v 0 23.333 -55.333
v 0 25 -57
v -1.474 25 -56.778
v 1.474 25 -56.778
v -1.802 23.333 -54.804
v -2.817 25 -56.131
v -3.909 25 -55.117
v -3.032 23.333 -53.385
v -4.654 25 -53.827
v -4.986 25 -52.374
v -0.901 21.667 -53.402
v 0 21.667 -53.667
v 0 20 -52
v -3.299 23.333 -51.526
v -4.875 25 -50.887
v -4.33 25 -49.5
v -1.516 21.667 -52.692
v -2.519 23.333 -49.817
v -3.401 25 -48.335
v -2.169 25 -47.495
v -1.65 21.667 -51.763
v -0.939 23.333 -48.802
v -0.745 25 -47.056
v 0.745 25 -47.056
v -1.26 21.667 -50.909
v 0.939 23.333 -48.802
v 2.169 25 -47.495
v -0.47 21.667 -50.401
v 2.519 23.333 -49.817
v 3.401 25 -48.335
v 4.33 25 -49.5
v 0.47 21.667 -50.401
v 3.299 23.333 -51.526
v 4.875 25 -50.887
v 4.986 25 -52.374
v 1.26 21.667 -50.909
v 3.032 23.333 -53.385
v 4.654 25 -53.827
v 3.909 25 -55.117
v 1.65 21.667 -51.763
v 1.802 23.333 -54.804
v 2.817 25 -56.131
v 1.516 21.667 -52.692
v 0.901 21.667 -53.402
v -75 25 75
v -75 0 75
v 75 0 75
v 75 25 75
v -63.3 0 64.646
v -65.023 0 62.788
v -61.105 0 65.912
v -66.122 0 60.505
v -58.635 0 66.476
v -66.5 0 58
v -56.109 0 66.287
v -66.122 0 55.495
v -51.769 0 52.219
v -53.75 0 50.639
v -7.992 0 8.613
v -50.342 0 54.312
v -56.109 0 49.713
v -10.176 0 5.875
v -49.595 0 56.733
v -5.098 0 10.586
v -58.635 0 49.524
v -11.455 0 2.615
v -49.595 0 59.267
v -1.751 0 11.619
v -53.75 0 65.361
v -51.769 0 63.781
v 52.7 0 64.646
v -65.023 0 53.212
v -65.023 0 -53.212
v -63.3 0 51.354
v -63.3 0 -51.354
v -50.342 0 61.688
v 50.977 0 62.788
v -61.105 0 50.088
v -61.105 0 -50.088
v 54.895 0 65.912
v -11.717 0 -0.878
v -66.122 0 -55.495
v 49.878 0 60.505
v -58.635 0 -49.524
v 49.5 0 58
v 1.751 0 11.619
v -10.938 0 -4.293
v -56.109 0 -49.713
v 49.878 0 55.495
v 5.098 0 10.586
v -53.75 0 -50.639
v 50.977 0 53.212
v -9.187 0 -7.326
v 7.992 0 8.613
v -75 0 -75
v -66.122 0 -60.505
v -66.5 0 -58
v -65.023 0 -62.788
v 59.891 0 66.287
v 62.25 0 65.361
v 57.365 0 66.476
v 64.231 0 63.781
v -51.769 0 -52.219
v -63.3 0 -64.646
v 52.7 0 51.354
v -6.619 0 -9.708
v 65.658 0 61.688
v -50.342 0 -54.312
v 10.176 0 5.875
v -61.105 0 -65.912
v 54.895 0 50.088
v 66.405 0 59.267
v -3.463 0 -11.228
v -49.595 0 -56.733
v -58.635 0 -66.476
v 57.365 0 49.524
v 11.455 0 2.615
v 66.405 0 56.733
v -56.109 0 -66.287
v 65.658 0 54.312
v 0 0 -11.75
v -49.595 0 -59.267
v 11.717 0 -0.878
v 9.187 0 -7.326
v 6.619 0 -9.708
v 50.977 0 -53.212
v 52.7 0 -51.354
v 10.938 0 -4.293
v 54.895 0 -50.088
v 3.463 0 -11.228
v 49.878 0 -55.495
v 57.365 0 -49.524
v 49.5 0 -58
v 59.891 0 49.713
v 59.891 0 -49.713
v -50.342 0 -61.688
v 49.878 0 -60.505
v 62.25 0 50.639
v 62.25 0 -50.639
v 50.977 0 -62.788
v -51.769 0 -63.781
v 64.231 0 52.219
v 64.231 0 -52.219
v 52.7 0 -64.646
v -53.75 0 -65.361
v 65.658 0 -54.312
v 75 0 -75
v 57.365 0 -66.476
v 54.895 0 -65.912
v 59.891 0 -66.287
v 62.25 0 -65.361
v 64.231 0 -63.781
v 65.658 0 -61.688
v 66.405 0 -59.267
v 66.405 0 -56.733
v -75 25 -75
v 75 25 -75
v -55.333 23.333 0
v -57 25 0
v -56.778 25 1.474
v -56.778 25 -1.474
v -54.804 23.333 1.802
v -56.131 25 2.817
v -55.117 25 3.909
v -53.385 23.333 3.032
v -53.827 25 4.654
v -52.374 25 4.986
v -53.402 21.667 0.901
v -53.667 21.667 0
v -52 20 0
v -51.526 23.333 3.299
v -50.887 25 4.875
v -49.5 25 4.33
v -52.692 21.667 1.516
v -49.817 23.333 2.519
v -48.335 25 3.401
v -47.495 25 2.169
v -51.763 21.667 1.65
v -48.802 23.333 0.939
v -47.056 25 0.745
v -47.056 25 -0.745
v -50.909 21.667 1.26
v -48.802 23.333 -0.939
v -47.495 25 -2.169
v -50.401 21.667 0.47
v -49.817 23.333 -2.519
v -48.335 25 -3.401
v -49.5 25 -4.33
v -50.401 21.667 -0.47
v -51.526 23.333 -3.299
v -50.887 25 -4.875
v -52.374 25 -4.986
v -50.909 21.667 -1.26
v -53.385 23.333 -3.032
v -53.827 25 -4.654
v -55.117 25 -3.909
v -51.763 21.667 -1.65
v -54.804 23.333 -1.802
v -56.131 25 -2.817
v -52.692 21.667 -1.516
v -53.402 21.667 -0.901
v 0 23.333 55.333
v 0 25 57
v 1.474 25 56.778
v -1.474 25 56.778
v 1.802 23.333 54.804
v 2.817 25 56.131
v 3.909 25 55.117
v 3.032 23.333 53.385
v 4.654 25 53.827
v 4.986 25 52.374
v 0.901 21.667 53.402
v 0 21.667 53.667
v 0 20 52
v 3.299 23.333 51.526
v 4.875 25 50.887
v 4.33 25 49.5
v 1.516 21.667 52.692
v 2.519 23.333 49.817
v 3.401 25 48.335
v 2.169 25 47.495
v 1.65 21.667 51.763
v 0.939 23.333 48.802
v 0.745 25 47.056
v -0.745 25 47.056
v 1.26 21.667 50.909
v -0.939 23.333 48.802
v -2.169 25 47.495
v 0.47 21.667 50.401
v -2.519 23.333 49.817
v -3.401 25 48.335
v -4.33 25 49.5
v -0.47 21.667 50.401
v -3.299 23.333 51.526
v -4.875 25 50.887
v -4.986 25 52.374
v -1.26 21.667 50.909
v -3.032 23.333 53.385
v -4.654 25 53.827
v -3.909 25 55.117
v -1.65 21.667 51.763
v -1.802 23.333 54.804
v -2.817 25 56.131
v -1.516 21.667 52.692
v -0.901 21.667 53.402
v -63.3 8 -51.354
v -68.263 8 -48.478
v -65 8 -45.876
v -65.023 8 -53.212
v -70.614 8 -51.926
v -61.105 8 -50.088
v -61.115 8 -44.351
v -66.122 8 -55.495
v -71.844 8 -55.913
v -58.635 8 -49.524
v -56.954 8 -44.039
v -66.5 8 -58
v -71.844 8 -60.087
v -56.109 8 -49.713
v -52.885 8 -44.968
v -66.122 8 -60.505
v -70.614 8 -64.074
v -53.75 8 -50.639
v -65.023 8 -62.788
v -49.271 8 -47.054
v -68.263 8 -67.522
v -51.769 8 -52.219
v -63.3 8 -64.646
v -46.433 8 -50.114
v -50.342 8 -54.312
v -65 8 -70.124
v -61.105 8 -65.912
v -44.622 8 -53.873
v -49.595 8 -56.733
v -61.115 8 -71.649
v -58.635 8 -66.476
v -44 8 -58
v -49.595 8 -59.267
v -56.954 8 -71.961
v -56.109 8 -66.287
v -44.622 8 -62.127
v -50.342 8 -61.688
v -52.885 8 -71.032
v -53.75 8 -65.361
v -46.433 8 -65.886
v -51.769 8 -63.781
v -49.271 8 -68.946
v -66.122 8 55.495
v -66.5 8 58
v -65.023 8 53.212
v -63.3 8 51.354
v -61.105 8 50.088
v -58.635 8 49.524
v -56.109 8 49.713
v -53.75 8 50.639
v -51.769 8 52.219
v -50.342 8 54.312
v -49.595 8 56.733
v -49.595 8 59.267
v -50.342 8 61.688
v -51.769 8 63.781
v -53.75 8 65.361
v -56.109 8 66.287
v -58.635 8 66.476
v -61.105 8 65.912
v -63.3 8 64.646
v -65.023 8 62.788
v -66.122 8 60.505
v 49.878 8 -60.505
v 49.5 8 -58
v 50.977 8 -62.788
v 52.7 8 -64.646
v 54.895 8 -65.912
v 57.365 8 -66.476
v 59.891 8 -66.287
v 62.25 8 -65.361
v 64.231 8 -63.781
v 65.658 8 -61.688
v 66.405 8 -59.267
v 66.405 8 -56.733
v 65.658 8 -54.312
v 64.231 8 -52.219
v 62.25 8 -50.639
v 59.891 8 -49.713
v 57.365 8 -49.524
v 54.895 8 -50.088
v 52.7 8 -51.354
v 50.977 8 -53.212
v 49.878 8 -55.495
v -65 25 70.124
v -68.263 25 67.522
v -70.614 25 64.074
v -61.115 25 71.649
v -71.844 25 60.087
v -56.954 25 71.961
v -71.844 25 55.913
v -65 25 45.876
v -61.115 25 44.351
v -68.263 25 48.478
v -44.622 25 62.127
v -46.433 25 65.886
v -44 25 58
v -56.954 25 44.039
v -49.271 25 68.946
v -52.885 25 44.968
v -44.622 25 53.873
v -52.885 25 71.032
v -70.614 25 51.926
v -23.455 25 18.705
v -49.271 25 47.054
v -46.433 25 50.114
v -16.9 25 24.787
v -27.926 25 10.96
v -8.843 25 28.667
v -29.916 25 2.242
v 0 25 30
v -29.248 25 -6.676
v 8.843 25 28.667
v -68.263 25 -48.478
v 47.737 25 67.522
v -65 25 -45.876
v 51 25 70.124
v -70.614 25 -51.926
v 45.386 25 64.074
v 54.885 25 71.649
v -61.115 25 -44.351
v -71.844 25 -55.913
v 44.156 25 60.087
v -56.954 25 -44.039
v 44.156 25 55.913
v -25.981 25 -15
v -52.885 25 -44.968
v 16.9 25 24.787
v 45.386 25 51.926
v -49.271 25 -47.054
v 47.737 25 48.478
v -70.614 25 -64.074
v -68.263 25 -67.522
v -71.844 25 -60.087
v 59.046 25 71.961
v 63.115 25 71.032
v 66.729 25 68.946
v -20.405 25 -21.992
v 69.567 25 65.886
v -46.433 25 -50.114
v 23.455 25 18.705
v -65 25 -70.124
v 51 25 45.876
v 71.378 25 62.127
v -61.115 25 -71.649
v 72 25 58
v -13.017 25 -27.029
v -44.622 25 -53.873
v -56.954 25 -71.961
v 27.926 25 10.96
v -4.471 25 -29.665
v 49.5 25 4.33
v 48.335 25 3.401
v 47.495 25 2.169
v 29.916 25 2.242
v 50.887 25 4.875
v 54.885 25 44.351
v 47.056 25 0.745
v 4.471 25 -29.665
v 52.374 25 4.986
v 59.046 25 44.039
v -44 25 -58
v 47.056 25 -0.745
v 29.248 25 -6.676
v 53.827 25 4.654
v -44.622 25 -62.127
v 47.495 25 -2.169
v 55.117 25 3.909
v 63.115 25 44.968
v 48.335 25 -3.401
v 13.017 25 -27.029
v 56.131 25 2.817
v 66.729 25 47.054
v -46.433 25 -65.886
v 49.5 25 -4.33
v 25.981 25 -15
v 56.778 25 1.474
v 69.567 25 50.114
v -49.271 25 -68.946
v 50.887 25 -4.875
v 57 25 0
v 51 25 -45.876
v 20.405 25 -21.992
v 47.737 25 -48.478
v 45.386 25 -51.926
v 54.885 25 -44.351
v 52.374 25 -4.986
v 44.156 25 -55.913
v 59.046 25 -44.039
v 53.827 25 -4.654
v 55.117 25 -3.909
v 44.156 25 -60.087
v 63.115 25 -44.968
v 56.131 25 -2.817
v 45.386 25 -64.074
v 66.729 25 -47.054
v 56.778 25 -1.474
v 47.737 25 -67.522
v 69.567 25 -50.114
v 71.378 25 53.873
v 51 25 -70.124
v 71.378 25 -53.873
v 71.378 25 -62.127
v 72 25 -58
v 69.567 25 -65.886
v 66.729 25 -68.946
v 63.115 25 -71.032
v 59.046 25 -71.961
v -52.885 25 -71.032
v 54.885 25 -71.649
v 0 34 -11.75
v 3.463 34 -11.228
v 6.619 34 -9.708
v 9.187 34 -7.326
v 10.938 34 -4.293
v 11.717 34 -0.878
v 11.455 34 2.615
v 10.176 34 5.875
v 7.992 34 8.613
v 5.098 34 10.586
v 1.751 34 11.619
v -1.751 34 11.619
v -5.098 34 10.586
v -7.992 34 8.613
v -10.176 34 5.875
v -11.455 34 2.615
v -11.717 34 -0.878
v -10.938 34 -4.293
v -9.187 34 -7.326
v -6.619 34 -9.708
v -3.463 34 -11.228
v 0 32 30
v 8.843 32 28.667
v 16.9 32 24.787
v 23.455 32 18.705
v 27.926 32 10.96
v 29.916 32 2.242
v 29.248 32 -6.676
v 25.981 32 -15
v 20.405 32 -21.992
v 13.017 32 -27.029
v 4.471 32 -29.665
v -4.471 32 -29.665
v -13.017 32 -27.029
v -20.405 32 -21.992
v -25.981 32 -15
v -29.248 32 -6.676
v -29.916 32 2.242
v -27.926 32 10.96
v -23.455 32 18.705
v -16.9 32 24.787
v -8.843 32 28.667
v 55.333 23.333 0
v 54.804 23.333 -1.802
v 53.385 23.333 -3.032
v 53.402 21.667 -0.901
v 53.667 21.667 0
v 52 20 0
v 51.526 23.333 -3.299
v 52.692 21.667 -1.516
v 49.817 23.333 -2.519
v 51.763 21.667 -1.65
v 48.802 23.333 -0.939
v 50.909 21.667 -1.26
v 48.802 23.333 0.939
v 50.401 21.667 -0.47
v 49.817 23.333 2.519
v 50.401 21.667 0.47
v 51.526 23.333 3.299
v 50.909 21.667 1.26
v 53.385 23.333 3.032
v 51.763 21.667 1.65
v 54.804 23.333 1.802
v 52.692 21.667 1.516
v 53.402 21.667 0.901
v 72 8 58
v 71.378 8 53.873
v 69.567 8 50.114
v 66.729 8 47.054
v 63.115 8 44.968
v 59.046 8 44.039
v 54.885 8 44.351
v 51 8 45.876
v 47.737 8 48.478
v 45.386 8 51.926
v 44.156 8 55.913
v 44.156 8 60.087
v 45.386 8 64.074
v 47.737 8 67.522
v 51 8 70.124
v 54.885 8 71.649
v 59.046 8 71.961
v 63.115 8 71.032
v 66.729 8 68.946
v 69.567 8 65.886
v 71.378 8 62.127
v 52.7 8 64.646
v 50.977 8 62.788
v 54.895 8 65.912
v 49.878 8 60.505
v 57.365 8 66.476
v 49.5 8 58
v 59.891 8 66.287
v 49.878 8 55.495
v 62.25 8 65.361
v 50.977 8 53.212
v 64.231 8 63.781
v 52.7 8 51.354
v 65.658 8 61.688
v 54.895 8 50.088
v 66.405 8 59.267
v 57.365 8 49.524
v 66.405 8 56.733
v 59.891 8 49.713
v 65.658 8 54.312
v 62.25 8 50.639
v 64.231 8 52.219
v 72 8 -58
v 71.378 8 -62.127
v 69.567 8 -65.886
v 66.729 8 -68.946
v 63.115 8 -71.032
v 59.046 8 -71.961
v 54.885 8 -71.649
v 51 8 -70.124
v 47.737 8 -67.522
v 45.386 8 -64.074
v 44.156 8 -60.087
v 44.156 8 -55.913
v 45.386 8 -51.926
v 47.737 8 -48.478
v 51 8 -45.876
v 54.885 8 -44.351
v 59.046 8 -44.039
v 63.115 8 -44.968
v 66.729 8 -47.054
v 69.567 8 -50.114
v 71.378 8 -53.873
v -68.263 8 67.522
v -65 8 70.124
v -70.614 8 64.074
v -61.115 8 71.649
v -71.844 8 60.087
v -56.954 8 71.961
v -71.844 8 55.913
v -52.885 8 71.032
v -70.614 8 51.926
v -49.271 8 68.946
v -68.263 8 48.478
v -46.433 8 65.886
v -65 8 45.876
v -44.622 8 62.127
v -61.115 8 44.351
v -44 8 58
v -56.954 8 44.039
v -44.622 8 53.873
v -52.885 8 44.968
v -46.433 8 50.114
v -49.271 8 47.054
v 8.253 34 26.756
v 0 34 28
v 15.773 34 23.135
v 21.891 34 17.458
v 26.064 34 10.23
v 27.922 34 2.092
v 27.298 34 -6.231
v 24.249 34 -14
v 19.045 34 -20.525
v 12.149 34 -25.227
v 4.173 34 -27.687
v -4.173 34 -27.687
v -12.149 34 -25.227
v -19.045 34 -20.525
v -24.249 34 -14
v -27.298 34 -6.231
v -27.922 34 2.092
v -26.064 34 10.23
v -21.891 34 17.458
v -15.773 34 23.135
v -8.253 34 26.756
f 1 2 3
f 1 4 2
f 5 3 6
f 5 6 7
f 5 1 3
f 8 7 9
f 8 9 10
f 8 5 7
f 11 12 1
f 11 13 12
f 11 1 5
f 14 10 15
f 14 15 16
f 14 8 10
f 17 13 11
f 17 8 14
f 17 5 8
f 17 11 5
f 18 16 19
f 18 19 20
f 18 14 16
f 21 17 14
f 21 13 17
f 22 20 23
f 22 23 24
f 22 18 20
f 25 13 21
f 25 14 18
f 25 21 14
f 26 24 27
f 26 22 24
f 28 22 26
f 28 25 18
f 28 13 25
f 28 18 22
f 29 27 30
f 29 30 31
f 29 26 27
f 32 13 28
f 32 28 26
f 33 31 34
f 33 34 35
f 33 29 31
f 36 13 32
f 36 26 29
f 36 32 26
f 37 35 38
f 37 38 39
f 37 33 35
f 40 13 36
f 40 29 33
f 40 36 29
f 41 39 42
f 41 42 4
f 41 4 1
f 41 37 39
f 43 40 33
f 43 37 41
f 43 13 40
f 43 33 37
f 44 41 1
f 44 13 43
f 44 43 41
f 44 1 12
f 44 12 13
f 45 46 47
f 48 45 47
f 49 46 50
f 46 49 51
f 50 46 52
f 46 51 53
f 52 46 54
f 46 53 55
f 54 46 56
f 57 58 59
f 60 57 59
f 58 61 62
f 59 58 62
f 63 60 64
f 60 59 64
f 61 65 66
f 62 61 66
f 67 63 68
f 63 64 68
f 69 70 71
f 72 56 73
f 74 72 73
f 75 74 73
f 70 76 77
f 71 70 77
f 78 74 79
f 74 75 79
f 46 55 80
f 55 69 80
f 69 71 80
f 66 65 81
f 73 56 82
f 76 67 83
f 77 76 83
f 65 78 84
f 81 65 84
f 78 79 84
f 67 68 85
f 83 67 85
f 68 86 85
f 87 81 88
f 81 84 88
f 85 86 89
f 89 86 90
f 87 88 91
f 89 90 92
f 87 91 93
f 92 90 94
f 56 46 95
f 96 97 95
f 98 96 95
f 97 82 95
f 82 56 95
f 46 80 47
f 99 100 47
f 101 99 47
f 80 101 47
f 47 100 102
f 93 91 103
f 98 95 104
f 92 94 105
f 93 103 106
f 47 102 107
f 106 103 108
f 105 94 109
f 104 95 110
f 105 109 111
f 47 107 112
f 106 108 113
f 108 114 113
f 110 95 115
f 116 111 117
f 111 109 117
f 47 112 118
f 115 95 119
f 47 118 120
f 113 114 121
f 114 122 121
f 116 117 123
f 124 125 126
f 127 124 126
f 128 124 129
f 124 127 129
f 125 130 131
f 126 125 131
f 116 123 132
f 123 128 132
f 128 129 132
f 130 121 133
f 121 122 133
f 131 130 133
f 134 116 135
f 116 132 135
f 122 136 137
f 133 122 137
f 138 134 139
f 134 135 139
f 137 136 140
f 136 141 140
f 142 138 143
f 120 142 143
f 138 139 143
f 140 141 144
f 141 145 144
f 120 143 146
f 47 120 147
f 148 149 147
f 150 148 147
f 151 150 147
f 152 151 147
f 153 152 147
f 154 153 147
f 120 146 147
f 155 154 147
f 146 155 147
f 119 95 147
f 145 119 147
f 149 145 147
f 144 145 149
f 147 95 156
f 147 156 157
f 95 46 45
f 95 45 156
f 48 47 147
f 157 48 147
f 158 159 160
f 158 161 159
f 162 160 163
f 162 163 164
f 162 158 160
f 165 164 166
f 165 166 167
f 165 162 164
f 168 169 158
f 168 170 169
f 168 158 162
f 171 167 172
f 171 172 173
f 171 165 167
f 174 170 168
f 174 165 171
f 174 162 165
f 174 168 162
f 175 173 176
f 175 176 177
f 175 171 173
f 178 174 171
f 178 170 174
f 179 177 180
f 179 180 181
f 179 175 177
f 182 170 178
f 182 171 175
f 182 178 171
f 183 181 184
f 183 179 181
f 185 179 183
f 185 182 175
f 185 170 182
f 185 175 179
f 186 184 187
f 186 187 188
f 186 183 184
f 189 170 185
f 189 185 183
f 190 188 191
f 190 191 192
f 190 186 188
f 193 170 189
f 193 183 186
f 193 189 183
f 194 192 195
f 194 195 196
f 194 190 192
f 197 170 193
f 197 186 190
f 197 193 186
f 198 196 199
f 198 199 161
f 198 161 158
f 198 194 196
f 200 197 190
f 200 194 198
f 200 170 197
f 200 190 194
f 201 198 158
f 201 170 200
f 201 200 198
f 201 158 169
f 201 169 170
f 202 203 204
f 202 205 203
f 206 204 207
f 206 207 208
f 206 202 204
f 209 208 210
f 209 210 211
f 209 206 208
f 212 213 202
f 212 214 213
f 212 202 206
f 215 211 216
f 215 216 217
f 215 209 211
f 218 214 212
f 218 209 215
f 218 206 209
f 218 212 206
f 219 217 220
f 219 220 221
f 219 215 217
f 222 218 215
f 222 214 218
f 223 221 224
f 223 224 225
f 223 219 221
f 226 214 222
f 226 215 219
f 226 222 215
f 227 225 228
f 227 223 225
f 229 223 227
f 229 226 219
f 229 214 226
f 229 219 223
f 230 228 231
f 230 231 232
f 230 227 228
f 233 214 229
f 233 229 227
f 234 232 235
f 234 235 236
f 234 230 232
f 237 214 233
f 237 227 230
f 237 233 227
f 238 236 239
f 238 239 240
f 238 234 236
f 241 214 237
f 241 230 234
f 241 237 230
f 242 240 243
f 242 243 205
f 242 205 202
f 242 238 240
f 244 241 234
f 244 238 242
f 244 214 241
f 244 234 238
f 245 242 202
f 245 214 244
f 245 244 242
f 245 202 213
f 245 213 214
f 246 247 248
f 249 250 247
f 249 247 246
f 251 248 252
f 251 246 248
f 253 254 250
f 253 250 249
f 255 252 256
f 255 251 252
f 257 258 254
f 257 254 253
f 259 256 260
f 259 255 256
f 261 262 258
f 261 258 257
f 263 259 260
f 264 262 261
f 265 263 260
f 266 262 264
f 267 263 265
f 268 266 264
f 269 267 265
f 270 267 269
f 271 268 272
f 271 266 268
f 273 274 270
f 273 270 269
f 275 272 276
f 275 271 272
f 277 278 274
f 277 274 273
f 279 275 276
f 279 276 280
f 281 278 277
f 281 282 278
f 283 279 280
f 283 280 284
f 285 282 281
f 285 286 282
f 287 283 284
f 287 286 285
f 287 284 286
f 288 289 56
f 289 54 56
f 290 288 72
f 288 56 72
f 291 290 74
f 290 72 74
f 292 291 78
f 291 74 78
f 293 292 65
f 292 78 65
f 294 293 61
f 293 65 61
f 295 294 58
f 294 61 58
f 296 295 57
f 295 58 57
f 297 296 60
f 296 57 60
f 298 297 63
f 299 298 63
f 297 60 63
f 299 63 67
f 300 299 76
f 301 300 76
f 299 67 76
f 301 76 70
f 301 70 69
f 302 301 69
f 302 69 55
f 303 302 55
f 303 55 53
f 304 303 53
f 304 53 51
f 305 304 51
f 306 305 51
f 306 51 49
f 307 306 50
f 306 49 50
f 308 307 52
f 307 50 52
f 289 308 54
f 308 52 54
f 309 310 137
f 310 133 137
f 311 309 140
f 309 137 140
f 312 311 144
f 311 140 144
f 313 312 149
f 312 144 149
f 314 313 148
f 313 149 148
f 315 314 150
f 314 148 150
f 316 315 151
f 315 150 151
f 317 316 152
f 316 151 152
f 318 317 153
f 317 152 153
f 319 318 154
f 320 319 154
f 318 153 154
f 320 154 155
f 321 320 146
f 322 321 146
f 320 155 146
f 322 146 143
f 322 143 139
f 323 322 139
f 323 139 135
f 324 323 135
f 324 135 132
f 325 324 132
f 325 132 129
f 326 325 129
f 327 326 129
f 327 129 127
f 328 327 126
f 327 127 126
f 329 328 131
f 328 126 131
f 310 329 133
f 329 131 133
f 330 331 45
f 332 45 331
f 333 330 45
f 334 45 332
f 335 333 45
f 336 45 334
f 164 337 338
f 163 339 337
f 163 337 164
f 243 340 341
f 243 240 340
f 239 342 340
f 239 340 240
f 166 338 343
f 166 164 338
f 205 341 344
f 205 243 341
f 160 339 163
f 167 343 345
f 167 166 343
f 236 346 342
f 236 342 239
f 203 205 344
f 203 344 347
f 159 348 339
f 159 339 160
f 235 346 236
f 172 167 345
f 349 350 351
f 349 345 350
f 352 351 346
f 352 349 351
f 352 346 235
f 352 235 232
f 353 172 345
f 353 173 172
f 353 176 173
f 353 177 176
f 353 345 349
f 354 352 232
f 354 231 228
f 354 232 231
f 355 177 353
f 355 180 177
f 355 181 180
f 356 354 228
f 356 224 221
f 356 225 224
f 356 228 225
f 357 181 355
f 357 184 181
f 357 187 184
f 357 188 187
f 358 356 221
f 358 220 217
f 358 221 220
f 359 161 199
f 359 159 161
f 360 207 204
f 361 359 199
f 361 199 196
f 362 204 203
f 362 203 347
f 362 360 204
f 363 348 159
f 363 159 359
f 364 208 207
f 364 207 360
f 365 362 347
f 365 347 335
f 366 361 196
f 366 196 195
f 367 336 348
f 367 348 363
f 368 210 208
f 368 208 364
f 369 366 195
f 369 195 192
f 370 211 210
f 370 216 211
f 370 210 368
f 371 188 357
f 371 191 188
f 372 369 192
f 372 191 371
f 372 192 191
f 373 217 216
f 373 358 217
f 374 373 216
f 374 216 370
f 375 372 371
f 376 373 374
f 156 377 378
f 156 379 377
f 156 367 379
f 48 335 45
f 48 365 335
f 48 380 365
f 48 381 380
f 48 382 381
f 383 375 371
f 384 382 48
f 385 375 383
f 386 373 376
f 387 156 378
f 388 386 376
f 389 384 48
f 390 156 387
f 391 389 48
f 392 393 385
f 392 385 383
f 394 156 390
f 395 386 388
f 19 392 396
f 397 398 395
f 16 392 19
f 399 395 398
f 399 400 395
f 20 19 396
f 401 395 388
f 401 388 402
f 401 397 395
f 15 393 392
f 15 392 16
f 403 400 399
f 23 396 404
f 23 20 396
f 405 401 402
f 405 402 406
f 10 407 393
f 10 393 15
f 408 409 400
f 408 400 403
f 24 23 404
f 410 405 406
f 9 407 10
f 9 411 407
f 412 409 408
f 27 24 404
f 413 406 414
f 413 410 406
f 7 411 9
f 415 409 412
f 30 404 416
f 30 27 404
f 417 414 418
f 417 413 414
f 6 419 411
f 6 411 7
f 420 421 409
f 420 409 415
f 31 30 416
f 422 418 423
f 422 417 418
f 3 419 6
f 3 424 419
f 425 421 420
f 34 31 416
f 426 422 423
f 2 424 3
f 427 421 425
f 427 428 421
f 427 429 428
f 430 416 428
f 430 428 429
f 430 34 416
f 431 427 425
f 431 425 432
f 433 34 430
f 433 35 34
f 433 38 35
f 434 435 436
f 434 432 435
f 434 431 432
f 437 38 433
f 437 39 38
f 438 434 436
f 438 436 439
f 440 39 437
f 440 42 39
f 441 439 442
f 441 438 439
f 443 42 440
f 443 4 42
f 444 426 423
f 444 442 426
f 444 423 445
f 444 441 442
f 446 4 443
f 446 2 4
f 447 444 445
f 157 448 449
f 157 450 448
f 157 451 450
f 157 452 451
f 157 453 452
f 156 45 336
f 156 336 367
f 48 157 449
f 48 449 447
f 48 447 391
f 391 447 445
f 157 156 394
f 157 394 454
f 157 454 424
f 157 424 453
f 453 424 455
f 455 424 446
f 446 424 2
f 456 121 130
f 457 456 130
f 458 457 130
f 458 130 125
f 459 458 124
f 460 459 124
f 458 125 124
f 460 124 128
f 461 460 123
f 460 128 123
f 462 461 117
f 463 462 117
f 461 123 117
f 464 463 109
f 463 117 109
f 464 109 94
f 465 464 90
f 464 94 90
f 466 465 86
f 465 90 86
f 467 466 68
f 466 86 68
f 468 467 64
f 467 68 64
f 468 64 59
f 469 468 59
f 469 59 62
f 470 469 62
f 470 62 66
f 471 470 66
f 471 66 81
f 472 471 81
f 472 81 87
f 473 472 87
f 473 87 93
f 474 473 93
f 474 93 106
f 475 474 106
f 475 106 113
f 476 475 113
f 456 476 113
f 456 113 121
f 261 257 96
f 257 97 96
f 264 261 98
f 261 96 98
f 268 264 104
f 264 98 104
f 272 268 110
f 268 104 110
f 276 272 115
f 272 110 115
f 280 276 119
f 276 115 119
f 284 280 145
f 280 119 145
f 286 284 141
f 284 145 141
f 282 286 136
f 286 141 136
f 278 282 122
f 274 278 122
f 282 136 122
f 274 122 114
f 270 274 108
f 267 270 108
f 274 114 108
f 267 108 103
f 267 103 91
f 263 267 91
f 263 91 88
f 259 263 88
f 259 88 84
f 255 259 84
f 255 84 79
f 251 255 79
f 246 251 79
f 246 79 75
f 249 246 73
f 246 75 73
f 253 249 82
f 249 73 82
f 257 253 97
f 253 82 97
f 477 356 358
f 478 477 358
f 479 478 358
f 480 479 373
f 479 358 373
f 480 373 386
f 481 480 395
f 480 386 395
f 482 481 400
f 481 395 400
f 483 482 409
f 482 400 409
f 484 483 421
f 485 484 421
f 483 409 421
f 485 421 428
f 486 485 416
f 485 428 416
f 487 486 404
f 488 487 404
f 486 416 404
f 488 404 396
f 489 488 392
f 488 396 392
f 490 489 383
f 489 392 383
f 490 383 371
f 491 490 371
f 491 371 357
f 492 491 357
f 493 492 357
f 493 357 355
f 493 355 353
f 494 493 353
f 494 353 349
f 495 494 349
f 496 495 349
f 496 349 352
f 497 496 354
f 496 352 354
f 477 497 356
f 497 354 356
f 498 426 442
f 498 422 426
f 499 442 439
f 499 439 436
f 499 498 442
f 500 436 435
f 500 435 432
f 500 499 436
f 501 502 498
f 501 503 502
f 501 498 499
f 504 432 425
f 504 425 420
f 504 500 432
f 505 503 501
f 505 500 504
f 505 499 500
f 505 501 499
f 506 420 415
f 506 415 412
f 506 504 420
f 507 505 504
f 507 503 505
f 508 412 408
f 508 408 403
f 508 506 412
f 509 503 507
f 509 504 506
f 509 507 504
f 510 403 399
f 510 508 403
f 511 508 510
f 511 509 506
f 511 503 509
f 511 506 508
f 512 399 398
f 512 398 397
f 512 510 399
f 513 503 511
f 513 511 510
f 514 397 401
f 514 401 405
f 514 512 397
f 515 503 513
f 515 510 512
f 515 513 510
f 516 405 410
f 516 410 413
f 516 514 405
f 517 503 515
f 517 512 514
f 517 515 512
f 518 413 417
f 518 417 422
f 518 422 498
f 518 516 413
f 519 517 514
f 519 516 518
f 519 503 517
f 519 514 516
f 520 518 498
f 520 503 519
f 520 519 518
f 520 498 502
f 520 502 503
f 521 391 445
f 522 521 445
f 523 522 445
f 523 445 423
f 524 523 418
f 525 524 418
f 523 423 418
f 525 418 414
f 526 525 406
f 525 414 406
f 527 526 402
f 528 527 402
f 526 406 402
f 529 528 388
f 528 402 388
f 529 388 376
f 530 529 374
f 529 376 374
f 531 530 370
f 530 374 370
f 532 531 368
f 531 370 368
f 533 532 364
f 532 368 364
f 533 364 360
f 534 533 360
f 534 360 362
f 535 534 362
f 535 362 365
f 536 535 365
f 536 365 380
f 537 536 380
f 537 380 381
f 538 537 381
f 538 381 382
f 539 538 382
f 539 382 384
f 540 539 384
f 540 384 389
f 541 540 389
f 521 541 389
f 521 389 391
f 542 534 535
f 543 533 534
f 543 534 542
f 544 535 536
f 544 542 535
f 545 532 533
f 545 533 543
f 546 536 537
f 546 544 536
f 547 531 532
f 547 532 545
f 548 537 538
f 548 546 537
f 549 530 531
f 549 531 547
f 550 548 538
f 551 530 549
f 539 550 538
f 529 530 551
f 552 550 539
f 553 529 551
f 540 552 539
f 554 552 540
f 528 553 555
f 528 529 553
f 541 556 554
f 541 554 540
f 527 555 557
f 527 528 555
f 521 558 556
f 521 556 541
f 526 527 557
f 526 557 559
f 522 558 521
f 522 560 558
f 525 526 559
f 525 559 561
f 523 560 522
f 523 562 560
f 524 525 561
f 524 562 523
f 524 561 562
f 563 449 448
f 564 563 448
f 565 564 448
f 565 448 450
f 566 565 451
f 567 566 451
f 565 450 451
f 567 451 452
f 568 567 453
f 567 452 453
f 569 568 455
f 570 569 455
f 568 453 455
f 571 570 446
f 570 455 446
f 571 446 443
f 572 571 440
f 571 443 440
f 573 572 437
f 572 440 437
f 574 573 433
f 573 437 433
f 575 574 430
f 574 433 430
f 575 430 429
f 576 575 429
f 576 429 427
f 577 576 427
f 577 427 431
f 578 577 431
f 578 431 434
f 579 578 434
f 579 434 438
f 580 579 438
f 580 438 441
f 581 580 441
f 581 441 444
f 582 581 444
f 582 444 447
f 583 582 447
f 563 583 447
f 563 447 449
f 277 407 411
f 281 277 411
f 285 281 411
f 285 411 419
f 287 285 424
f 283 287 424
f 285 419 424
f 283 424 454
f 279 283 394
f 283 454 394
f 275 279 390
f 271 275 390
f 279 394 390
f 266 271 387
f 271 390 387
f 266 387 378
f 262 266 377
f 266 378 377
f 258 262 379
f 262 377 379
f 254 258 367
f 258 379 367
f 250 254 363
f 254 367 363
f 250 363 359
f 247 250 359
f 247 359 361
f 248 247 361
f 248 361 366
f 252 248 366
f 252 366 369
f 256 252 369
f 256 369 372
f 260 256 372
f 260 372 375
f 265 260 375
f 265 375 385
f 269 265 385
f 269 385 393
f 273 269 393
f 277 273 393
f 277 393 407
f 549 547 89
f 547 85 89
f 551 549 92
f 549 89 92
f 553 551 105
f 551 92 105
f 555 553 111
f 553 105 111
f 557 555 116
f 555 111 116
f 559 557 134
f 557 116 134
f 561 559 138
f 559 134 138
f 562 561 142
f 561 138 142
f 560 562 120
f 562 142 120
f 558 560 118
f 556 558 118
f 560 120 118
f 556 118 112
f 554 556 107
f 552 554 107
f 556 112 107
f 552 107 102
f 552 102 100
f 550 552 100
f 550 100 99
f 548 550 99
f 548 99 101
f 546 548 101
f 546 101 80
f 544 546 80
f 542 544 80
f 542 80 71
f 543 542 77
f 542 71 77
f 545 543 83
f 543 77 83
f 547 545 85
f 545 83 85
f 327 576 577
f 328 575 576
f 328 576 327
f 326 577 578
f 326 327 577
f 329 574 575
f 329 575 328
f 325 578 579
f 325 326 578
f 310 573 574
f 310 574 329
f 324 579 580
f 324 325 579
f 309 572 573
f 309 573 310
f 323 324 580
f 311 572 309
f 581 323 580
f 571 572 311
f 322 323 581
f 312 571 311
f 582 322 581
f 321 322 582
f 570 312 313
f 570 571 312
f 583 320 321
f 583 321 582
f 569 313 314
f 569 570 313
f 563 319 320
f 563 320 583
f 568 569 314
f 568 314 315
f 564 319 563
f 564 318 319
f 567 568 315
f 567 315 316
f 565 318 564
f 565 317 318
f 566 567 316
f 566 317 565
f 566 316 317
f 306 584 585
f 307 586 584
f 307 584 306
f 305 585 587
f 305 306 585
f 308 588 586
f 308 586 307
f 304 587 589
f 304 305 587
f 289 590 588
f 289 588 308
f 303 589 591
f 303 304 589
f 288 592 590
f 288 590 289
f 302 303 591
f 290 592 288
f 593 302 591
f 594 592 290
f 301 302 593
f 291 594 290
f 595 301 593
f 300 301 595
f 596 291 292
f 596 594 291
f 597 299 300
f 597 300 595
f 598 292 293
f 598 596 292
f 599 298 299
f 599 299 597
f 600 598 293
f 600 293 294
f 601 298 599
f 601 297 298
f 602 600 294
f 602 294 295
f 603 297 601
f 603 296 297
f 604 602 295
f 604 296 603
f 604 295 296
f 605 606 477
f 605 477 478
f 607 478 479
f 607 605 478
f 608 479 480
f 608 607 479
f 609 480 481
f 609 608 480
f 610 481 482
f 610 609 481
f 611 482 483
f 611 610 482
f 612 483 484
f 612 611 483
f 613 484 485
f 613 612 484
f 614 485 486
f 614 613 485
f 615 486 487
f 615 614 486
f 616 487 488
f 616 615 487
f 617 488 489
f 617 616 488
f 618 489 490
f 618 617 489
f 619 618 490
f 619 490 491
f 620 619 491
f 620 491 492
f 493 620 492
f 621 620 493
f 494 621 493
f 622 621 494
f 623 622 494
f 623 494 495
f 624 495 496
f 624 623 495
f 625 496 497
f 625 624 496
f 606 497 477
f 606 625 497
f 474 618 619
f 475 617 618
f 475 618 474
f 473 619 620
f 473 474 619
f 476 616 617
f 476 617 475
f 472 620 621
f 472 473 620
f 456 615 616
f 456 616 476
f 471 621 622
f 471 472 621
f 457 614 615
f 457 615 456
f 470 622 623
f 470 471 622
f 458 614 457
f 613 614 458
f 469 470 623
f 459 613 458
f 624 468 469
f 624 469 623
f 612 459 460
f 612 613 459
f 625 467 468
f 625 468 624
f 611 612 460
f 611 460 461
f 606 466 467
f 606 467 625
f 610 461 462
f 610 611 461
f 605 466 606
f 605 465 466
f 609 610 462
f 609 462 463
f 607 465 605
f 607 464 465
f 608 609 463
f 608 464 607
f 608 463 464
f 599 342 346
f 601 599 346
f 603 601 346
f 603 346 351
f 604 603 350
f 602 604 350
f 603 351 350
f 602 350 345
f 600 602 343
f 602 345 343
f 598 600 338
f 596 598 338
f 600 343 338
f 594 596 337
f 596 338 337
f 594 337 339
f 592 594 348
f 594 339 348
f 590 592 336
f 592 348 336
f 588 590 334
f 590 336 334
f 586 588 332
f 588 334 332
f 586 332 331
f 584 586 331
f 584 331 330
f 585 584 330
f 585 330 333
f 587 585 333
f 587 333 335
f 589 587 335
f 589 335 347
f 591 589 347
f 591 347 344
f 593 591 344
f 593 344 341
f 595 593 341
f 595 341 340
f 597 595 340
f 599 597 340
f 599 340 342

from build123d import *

# Parameters (mm, degrees)
SKETCH2_W              = 150
SKETCH2_H              = 150
BOSS_EXTRUDE1_DEPTH    = 25
SKETCH3_R              = 30
BOSS_EXTRUDE2_DEPTH    = 9
CHAMFER1_SIZE          = 2
HOLE1_D                = 17
HOLE1_CBORE_D          = 28
HOLE1_CBORE_DEPTH      = 17
M25X1_5_TAPPED_HOLE1_D = 23.5
CIRPATTERN1_COUNT      = 4


with BuildPart() as part:
    # Sketch2 → Boss-Extrude1 (new body)
    with BuildSketch(Plane(origin=(0, 0, 0), x_dir=(1, 0, 0), z_dir=(0, 1, 0))):
        Rectangle(SKETCH2_W, SKETCH2_H)
    extrude(amount=BOSS_EXTRUDE1_DEPTH)

    # Sketch3 → Boss-Extrude2 (add)
    with BuildSketch(Plane(origin=(0, 25, 0), x_dir=(1, 0, 0), z_dir=(0, 1, 0))):
        with Locations(Location((0, 0, 0), (0, 0, 270))):
            Circle(SKETCH3_R)
    extrude(amount=BOSS_EXTRUDE2_DEPTH)

    # Chamfer1
    chamfer1_edges = [part.edges().sort_by_distance(p)[0] for p in [
        (0, 34, -30),
    ]]
    chamfer(chamfer1_edges, length=CHAMFER1_SIZE)

    # Hole1 (through all)
    with Locations(Plane(origin=(0, 25, 0), x_dir=(1, 0, 0), z_dir=(0, 1, 0))):
        with Locations((-58, 58), (58, 58), (58, -58), (-58, -58)):
            CounterBoreHole(HOLE1_D / 2, HOLE1_CBORE_D / 2, HOLE1_CBORE_DEPTH)

    # Sketch13 → Cut-Revolve1 (revolve, cut)
    with BuildSketch(Plane.XY):
        Polygon((-57, 25), (-52, 20), (-52, 25), align=None)
    cut_revolve1 = revolve(axis=Axis((-52, 20, 0), (0, 1, 0)), mode=Mode.SUBTRACT)

    # M25x1.5 Tapped Hole1 (through all)
    with Locations(Plane.ZX.offset(34)):
        with Locations((0, 0)):
            Hole(M25X1_5_TAPPED_HOLE1_D / 2)

    # CirPattern1: Cut-Revolve1 ×4 about axis
    cirpattern1_axis = Axis((0, 0, 0), (0, 1, 0))
    for i in range(1, CIRPATTERN1_COUNT):
        add(cut_revolve1.rotate(cirpattern1_axis, i * 360 / CIRPATTERN1_COUNT), mode=Mode.SUBTRACT)


solid = part.part
